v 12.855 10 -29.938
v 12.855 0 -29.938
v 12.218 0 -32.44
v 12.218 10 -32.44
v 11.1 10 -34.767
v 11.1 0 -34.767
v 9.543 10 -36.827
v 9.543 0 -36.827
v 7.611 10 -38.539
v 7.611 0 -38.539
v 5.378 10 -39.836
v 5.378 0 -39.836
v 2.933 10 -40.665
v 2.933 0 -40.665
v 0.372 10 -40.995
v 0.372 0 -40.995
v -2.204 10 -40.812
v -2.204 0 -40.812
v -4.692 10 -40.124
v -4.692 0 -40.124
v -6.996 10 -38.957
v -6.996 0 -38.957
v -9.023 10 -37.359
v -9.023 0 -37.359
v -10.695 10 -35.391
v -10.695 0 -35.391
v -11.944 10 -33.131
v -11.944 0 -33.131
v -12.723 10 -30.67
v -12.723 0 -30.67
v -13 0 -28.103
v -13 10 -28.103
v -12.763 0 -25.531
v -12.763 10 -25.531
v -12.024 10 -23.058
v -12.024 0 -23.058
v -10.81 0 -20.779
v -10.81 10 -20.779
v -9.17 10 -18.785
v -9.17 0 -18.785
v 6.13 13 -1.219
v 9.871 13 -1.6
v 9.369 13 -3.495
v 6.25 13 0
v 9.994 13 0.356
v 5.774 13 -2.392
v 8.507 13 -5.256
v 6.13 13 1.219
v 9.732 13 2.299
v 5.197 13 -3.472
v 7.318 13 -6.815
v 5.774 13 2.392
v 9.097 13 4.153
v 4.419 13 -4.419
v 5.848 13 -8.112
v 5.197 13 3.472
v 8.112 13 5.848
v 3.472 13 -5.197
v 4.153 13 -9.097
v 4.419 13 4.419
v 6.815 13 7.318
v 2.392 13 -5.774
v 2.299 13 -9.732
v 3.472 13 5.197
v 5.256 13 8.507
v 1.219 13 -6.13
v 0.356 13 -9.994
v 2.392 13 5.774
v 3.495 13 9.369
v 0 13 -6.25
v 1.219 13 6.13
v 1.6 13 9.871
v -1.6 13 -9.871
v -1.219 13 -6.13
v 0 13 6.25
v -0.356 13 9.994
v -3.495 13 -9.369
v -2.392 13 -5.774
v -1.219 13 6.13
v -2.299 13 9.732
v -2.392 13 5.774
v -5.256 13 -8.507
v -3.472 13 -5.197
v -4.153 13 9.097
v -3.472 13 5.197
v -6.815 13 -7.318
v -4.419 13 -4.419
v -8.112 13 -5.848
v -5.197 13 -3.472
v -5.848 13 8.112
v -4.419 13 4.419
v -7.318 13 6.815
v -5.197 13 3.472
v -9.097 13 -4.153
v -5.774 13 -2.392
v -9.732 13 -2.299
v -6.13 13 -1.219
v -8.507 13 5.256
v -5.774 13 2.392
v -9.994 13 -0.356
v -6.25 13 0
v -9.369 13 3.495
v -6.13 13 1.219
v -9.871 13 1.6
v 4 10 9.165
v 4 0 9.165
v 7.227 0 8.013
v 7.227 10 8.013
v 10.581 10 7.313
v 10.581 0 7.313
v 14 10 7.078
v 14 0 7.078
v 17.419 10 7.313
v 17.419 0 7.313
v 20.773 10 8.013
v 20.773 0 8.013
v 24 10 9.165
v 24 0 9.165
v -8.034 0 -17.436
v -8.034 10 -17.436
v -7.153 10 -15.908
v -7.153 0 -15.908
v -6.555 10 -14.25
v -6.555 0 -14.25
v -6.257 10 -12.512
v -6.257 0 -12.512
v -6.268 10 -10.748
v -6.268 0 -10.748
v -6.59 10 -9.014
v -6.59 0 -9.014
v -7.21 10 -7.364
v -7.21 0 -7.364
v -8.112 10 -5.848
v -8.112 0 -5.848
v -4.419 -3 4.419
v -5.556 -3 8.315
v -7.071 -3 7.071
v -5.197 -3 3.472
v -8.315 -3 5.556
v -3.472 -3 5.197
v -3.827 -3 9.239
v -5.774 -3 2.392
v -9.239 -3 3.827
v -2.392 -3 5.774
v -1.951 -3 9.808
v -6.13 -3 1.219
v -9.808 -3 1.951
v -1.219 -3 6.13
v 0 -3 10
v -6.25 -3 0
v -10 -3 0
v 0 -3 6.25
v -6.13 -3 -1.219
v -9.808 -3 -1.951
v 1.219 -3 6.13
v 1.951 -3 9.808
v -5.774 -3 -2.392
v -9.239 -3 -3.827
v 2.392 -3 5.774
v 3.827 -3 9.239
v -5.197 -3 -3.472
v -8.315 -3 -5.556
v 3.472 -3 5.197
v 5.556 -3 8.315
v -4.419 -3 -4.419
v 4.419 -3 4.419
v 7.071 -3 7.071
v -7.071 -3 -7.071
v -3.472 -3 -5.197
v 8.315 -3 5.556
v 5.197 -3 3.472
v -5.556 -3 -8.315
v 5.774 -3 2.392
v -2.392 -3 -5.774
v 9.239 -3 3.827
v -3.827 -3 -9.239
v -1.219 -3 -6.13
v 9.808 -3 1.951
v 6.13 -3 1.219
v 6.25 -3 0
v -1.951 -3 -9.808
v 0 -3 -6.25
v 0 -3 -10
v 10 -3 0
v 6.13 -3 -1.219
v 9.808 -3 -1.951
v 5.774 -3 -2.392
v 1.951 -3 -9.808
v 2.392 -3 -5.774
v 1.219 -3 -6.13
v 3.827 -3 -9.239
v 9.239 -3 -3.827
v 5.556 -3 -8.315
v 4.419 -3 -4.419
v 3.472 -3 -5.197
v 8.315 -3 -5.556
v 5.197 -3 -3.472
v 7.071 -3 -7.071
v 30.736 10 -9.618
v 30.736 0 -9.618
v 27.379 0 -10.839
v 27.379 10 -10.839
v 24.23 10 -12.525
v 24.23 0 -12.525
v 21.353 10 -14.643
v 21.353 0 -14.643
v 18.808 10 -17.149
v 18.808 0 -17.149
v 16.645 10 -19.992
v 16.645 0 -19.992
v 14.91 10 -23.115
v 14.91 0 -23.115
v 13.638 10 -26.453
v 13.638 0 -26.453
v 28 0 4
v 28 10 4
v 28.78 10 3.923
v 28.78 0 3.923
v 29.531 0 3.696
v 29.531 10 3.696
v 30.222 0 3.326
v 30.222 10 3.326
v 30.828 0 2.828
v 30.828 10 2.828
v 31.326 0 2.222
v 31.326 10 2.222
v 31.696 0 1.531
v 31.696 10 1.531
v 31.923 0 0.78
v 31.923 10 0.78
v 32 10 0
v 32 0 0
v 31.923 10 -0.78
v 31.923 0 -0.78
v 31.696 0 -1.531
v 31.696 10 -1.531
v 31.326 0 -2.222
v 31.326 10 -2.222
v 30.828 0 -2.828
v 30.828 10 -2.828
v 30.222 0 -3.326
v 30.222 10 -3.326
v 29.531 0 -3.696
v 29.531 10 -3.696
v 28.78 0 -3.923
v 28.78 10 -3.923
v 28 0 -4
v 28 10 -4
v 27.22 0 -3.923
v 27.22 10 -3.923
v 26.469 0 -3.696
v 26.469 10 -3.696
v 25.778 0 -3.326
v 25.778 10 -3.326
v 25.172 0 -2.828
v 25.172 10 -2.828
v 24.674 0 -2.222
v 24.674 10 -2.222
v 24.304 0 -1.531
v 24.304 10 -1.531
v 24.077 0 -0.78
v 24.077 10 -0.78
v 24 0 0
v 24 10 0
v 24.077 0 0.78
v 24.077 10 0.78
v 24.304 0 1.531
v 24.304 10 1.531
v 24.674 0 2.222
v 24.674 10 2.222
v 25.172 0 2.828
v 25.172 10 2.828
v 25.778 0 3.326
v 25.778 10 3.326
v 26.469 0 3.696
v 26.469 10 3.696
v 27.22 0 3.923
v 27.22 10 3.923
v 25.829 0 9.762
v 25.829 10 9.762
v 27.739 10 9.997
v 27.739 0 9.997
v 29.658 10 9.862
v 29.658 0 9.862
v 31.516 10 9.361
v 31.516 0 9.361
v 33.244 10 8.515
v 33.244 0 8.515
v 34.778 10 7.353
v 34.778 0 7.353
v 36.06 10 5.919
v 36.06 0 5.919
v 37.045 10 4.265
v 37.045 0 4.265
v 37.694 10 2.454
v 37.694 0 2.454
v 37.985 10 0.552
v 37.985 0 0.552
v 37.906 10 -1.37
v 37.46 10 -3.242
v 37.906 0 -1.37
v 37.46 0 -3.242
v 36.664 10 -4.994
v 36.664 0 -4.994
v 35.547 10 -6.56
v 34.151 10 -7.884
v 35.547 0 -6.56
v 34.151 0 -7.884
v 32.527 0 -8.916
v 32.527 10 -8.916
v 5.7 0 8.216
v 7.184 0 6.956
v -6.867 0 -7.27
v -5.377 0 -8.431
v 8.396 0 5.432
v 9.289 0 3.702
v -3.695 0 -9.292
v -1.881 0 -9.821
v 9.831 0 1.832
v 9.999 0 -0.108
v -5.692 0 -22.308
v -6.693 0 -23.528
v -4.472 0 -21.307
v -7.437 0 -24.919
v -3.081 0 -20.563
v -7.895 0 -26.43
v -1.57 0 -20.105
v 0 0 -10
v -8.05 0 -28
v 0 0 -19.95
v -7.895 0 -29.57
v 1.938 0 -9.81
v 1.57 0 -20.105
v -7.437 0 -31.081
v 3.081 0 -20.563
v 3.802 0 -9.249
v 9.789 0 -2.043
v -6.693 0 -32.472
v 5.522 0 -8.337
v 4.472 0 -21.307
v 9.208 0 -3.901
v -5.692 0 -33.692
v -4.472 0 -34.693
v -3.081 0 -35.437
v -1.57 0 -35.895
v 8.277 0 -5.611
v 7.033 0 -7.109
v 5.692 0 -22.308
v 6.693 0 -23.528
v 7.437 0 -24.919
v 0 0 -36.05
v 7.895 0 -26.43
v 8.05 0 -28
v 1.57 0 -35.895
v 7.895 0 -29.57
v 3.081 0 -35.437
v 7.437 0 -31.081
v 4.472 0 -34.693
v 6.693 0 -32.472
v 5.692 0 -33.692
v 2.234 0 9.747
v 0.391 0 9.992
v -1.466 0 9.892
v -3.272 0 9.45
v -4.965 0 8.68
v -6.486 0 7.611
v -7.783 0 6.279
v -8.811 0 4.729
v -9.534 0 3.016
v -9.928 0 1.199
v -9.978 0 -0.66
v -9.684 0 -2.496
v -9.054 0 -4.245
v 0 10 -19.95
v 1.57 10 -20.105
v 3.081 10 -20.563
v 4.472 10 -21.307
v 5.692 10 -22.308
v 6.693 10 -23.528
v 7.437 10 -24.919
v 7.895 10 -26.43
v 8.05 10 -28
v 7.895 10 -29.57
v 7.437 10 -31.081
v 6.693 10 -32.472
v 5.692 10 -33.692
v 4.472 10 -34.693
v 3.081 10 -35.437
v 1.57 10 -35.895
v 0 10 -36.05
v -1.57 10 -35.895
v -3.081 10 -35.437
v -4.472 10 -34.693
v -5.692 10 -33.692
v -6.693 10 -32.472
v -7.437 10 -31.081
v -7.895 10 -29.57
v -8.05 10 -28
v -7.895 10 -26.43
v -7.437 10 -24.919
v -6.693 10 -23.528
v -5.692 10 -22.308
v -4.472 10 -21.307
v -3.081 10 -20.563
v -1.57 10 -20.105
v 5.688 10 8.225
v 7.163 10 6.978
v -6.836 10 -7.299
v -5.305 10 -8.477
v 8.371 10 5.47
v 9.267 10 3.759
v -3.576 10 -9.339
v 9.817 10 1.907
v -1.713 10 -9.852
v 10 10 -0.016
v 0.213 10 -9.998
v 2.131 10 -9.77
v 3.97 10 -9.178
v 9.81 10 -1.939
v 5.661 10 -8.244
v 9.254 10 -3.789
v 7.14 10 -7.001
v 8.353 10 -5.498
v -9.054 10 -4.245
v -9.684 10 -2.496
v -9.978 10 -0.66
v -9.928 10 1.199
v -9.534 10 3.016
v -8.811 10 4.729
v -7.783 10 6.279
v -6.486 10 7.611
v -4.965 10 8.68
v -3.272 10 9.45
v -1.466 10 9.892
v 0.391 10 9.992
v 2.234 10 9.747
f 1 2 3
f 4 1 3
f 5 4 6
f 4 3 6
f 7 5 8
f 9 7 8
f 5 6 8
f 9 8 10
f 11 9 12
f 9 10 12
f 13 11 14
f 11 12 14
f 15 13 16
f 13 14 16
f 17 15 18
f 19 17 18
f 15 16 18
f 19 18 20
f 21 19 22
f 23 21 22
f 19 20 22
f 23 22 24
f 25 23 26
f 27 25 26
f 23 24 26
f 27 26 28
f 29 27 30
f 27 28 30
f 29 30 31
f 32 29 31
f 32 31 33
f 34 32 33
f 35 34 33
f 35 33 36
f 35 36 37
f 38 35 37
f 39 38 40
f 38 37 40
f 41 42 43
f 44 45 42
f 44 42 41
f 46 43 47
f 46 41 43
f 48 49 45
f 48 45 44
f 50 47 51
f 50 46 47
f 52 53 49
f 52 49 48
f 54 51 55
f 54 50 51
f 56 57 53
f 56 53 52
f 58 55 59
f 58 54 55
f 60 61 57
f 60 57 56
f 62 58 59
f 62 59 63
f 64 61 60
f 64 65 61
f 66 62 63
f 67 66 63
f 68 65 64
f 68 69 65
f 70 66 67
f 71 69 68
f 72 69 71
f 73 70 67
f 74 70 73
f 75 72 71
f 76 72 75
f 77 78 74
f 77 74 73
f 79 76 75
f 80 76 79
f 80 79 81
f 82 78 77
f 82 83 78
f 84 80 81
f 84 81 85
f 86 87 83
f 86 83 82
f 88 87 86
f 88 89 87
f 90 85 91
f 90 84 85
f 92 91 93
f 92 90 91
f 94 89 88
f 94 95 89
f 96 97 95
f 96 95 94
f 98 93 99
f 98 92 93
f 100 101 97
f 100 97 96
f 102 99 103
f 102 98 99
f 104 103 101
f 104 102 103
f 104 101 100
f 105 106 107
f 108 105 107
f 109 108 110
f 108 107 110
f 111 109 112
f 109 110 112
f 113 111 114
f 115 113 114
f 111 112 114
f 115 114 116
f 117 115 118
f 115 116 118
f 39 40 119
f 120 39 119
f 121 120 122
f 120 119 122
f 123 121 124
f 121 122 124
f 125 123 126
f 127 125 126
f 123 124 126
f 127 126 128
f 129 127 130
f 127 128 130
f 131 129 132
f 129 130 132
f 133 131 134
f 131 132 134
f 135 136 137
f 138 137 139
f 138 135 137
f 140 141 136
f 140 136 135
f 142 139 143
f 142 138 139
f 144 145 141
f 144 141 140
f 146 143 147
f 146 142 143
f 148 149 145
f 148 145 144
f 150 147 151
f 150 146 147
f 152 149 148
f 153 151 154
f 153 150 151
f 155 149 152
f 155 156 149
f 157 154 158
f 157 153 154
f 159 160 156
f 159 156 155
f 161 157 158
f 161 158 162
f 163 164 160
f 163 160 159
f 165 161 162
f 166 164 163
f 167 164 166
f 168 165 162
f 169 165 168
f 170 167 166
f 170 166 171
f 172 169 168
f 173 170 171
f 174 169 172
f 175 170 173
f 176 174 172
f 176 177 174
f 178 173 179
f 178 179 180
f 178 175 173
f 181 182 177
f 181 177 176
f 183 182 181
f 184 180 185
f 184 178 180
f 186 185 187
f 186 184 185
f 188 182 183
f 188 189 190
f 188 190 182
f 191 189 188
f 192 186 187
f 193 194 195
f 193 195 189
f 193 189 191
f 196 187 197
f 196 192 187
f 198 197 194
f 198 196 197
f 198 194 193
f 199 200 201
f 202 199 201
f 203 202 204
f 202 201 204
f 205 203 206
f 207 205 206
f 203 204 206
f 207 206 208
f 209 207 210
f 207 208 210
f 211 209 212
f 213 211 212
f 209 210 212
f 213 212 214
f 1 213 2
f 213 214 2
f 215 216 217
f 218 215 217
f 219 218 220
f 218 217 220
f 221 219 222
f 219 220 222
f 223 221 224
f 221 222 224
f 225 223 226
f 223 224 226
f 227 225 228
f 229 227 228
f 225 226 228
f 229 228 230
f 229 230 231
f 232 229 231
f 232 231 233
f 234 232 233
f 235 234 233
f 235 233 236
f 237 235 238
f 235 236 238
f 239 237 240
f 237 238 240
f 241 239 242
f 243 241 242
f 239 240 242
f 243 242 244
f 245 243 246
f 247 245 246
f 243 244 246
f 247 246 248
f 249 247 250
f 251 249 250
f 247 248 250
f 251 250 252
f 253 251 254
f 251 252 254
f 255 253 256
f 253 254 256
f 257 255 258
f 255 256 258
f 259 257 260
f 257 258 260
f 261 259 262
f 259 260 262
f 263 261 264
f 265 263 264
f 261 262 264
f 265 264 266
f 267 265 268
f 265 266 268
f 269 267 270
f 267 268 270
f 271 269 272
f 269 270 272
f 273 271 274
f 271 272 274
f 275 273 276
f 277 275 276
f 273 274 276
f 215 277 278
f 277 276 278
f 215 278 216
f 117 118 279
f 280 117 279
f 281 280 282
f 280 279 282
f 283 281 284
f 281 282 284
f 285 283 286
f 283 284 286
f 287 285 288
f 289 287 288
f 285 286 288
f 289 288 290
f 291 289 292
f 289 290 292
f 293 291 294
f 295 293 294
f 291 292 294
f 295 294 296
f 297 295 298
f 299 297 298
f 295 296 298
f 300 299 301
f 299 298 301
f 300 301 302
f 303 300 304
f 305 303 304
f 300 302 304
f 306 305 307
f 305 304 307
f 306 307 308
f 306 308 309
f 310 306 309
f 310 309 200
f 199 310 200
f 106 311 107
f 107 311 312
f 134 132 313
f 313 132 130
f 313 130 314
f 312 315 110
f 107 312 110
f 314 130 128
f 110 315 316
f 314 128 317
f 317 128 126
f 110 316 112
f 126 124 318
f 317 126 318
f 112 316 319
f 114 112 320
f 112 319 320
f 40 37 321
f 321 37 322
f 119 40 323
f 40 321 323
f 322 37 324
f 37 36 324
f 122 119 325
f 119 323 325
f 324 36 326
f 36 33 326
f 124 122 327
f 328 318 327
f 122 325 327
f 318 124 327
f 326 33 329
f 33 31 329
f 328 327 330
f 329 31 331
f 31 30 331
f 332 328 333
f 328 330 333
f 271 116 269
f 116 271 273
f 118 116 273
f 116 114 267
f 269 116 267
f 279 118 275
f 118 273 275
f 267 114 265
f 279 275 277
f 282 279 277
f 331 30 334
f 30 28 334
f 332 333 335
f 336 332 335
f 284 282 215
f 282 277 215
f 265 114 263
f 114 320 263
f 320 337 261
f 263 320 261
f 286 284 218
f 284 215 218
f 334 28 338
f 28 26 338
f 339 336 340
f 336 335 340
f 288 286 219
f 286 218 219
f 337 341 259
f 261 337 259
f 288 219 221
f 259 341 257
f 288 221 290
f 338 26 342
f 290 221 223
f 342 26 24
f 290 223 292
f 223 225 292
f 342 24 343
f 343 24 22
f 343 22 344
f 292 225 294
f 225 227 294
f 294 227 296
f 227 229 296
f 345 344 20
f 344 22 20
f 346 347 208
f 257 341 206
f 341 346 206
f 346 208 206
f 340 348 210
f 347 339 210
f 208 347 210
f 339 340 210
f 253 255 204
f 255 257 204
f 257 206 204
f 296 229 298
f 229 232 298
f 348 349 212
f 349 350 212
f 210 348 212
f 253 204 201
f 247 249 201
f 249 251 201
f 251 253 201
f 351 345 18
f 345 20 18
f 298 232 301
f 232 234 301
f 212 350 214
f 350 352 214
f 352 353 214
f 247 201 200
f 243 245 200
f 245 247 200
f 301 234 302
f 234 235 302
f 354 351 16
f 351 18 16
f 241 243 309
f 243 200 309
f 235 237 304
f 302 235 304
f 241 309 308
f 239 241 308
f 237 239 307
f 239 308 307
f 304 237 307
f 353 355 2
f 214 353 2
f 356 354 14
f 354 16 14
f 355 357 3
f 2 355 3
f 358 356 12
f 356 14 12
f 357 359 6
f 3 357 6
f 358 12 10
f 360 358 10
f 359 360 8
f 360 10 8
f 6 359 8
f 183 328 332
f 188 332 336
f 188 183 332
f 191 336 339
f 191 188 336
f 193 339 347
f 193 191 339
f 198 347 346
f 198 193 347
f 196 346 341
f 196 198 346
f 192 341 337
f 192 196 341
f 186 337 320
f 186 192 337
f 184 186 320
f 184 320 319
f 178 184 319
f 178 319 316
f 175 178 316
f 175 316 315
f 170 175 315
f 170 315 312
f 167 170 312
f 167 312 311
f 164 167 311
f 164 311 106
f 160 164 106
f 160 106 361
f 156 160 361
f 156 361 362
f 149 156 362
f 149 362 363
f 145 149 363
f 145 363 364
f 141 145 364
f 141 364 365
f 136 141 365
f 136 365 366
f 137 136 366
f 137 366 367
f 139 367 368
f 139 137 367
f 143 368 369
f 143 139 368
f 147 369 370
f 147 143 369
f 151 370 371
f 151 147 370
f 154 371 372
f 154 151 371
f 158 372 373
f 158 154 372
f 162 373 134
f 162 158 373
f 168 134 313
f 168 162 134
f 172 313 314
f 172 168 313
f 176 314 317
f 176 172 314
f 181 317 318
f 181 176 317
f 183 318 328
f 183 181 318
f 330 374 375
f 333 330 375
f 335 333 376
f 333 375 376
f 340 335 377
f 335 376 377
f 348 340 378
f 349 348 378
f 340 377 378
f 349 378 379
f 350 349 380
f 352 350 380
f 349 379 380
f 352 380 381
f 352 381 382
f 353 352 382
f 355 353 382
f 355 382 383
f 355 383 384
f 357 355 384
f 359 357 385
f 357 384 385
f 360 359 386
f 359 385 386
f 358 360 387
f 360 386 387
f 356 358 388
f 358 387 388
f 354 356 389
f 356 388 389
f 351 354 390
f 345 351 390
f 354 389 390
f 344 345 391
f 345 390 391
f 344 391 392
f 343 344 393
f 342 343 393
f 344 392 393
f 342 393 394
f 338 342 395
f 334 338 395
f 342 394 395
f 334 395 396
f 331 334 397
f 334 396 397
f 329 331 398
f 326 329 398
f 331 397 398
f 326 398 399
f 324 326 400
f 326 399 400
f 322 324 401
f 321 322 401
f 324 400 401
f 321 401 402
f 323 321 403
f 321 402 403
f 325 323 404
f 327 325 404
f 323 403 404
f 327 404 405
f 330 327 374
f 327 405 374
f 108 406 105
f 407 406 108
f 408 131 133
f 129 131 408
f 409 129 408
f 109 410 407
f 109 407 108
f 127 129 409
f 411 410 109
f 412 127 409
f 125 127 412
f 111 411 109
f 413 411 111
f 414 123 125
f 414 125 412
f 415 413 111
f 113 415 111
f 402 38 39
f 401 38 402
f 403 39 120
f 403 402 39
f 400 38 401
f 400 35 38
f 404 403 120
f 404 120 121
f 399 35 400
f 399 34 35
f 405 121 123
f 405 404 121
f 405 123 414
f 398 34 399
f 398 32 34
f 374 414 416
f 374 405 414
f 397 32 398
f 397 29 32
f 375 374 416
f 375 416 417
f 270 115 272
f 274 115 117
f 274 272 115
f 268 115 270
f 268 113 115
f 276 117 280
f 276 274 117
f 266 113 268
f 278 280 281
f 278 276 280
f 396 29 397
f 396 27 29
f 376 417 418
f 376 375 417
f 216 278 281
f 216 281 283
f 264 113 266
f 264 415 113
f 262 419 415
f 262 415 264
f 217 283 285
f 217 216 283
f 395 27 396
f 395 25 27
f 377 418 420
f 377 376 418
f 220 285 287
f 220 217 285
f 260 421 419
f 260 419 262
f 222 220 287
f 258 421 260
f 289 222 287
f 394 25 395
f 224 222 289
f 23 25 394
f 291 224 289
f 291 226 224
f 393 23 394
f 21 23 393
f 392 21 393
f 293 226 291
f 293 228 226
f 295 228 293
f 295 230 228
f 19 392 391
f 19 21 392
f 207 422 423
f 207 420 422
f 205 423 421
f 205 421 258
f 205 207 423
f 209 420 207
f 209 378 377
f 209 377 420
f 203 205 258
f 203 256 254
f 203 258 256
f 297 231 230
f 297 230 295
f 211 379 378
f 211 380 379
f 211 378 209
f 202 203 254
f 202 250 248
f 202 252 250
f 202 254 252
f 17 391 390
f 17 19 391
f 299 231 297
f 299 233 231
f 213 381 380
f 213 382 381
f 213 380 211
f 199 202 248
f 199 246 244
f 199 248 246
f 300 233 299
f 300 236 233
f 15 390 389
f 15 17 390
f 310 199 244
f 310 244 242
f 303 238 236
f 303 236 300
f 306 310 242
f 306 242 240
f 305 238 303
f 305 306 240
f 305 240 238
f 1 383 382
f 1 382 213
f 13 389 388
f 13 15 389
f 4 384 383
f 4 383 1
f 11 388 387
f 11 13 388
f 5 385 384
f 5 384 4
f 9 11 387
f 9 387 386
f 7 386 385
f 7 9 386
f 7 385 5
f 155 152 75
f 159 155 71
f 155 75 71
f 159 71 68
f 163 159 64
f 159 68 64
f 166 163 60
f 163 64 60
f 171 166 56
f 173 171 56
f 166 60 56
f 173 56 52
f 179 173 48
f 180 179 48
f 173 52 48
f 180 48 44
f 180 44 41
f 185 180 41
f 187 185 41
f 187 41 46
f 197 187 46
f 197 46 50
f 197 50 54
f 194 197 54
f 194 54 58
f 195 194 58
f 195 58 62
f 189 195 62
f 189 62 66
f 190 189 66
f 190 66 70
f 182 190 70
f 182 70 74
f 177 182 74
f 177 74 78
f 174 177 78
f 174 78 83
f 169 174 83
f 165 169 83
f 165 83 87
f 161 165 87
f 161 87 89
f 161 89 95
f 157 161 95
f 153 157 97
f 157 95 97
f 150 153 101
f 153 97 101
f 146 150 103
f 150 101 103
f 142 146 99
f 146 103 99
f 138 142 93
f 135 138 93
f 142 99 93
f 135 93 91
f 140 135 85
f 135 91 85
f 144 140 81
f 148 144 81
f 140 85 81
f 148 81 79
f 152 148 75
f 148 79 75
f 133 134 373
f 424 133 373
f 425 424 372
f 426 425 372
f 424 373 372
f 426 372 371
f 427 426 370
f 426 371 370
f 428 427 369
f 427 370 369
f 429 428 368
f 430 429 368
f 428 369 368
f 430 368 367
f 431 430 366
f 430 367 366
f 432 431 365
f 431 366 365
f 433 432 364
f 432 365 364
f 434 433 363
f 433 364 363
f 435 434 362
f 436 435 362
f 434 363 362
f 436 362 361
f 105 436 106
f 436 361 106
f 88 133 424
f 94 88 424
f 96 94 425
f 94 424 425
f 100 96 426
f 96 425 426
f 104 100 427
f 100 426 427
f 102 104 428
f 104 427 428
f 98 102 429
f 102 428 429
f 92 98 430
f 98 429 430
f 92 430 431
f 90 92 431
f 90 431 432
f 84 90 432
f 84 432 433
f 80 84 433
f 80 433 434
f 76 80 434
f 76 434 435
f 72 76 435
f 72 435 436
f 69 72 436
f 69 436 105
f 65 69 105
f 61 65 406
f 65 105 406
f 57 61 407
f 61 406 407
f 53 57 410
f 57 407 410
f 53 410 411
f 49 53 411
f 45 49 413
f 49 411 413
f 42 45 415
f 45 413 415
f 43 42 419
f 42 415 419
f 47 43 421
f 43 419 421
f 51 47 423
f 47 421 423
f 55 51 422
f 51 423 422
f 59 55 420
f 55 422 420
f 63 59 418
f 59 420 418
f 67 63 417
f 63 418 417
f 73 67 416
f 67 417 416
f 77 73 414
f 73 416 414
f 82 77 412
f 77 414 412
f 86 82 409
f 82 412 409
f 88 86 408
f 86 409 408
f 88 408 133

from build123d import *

# Parameters (mm, degrees)
SALIENTE_EXTRUIR1_DEPTH = 10
CROQUIS2_R              = 8.05
CROQUIS2_R_2            = 4
CORTAR_EXTRUIR1_DEPTH   = 10
CROQUIS3_R              = 10
SALIENTE_EXTRUIR2_DEPTH = 3
SALIENTE_EXTRUIR3_START = 3
CROQUIS4_R              = 10
SALIENTE_EXTRUIR3_DEPTH = 3
CROQUIS5_R              = 6.25
CORTAR_EXTRUIR2_DEPTH   = 59.14636704


with BuildPart() as part:
    # Croquis1 → Saliente-Extruir1 (new body)
    with BuildSketch(Plane(origin=(0, 0, 0), x_dir=(1, 0, 0), z_dir=(0, 1, 0))):
        with BuildLine():
            ThreePointArc((-8.111620656, 5.848214286), (-7.783099854, -6.278802168), (4, -9.16515139))
            ThreePointArc((4, -9.16515139), (14, -7.078029865), (24, -9.16515139))
            ThreePointArc((24, -9.16515139), (37.413063718, -3.375534245), (30.735830721, 9.618483782))
            ThreePointArc((30.735830721, 9.618483782), (18.80756088, 17.149005774), (12.854744679, 29.937921371))
            ThreePointArc((12.854744679, 29.937921371), (-5.873008246, 39.597748667), (-9.169658133, 18.784937888))
            ThreePointArc((-9.169658133, 18.784937888), (-6.25651887, 12.511562773), (-8.111620656, 5.848214286))
        make_face()
    extrude(amount=SALIENTE_EXTRUIR1_DEPTH)

    # Croquis2 → Cortar-Extruir1 (cut)
    with BuildSketch(Plane(origin=(0, 10, 0), x_dir=(1, 0, 0), z_dir=(0, 1, 0))):
        with Locations(Location((0, 28, 0), (0, 0, 270))):
            Circle(CROQUIS2_R)
        with Locations(Location((28, 0, 0), (0, 0, 270))):
            Circle(CROQUIS2_R_2)
    extrude(amount=-CORTAR_EXTRUIR1_DEPTH, mode=Mode.SUBTRACT)

    # Croquis3 → Saliente-Extruir2 (add)
    with BuildSketch(Plane(origin=(0, 10, 0), x_dir=(1, 0, 0), z_dir=(0, 1, 0))):
        with Locations(Location((0, 0, 0), (0, 0, 144.209624239))):
            Circle(CROQUIS3_R)
    extrude(amount=SALIENTE_EXTRUIR2_DEPTH)

    # Croquis4 → Saliente-Extruir3 (add)
    with BuildSketch(Plane.XZ.offset(SALIENTE_EXTRUIR3_START)):
        with Locations(Location((0, 0, 0), (0, 0, 270))):
            Circle(CROQUIS4_R)
    extrude(amount=-SALIENTE_EXTRUIR3_DEPTH)

    # Croquis5 → Cortar-Extruir2 (cut, through all)
    with BuildSketch(Plane(origin=(0, 13, 0), x_dir=(1, 0, 0), z_dir=(0, 1, 0))):
        with Locations(Location((0, 0, 0), (0, 0, 270))):
            Circle(CROQUIS5_R)
    extrude(amount=-CORTAR_EXTRUIR2_DEPTH, mode=Mode.SUBTRACT)


solid = part.part
